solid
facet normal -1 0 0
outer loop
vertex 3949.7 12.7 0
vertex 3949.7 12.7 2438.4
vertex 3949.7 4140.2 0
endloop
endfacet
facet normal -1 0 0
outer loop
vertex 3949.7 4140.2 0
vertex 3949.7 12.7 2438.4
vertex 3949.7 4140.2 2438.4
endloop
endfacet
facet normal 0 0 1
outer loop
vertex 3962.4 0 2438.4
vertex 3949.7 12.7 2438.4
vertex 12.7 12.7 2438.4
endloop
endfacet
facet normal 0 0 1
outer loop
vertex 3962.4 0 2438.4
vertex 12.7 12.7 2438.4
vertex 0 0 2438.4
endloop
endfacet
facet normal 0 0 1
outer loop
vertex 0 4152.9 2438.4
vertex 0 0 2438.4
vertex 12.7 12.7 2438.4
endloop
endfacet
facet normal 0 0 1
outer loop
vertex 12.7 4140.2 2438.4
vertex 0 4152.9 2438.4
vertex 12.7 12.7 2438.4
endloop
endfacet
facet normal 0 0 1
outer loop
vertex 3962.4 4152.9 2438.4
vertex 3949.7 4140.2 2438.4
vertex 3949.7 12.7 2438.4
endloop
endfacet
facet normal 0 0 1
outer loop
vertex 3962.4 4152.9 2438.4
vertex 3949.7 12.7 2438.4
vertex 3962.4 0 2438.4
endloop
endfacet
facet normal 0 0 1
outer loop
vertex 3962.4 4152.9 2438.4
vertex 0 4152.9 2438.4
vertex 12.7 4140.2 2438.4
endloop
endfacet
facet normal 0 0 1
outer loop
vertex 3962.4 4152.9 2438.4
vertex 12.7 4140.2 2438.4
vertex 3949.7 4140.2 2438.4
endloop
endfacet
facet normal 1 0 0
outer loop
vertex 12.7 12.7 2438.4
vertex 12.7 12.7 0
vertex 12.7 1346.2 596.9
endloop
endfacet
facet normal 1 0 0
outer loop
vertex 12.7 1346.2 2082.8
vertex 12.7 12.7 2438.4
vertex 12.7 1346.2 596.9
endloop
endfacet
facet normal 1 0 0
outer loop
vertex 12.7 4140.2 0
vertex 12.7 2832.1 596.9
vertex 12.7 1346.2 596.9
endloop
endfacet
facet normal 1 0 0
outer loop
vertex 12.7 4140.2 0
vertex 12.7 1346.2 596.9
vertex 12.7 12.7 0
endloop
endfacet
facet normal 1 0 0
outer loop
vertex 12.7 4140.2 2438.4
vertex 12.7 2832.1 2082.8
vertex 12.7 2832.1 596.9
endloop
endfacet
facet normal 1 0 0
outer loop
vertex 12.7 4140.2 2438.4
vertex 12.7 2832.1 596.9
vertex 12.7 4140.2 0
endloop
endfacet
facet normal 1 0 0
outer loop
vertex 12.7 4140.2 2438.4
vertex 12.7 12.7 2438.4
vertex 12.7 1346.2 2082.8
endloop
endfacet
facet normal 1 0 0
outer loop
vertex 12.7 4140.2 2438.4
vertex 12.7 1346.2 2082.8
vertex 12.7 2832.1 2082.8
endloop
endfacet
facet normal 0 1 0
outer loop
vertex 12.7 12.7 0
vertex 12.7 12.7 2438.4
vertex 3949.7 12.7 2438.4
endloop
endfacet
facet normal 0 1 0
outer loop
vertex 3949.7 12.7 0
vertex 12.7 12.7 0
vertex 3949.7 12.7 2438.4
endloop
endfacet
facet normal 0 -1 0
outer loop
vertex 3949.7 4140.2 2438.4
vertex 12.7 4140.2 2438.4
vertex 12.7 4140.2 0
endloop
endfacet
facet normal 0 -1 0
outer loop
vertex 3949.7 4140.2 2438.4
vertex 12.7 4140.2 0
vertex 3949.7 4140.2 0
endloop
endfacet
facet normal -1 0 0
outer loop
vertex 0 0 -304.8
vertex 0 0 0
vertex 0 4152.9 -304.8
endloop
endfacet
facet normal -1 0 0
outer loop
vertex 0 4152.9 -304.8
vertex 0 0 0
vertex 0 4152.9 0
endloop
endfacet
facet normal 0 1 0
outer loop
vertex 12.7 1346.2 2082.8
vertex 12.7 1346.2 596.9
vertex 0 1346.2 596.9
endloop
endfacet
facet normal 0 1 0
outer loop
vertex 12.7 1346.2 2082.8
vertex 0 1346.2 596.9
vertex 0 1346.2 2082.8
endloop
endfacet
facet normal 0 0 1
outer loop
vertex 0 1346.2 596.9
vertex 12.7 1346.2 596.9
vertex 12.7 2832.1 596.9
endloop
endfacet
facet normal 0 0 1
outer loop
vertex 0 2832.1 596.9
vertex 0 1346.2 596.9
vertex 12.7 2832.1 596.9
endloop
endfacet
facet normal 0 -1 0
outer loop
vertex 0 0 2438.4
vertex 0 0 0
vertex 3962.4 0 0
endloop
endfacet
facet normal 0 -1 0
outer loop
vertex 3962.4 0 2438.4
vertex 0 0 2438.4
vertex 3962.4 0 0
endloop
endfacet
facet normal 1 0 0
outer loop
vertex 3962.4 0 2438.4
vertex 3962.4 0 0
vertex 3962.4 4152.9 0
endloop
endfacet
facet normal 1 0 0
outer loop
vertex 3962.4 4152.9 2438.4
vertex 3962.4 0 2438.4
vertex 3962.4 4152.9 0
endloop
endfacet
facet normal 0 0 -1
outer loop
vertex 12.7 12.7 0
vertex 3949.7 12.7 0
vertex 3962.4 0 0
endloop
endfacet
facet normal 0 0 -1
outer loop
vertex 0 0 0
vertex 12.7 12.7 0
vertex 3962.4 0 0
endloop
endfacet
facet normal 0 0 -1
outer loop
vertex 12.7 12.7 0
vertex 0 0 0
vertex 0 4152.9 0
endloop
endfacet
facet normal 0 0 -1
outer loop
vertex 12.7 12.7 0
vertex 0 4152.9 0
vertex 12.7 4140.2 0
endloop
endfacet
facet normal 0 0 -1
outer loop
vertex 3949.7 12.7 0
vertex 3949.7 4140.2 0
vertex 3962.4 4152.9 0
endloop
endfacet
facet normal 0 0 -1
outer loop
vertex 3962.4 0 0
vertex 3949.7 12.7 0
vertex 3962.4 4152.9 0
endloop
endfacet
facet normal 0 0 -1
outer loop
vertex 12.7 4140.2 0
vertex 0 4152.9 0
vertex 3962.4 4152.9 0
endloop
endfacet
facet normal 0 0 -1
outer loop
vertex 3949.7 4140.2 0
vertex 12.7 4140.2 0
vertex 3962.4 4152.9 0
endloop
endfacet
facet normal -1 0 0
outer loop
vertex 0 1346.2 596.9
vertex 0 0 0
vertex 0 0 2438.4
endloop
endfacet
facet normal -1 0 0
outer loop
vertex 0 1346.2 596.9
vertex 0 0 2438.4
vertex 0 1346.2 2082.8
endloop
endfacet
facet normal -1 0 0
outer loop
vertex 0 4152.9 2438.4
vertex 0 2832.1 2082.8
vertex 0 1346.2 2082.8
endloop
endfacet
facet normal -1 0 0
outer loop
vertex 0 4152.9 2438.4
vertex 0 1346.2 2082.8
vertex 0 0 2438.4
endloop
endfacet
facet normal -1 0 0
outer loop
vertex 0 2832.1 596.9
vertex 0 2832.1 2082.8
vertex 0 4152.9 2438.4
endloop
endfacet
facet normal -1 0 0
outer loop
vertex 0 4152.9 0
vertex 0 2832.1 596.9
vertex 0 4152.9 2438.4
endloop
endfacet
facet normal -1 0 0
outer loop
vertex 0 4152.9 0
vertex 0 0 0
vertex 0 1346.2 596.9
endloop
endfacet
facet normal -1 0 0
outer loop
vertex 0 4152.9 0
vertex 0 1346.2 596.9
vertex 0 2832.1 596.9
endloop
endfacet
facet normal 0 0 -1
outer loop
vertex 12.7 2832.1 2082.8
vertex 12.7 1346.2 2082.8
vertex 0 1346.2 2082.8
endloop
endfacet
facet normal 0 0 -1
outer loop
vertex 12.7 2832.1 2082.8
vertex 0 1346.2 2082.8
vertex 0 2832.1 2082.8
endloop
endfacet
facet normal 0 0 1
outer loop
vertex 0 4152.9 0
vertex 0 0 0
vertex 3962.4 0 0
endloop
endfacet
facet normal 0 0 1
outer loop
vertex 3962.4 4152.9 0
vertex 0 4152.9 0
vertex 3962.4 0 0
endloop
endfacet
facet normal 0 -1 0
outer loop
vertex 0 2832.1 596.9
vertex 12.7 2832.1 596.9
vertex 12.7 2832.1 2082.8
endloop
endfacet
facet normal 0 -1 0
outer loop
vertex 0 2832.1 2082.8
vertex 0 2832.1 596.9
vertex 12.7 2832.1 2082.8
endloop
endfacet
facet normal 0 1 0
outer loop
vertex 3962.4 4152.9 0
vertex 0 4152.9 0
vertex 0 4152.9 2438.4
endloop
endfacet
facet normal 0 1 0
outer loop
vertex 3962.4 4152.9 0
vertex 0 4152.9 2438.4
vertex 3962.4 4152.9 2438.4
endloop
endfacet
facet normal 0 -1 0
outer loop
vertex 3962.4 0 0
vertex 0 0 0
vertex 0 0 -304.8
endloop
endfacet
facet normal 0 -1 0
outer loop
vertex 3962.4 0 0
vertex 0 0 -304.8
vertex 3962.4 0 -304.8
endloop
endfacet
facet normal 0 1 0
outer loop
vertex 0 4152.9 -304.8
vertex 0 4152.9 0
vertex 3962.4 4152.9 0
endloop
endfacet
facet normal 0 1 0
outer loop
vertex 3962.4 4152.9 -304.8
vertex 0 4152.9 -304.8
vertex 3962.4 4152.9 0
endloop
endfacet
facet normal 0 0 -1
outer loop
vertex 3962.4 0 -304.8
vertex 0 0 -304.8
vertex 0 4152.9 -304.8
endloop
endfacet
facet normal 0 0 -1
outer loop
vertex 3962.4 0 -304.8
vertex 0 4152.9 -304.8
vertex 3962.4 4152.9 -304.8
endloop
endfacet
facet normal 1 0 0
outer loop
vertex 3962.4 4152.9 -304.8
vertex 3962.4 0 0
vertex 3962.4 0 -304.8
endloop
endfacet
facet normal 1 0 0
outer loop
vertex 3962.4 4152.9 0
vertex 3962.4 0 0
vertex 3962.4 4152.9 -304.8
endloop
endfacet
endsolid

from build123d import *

# Parameters (mm, degrees)
F2_W     = 3962.4
F2_H     = 4152.9
F3_DEPTH = 304.8
F4_DEPTH = 2438.4
F5_W     = 3937
F5_H     = 4127.5
F6_DEPTH = 2438.4
F7_W     = 1485.9
F7_H     = 1485.9
F8_DEPTH = 12.7


with BuildPart() as f3:
    # F2 (on Top) → F3 (new body)
    with BuildSketch(Plane.XY):
        with Locations((1981.2, 2076.45)):
            Rectangle(F2_W, F2_H)
    extrude(amount=-F3_DEPTH)


with BuildPart() as f4:
    # F2 (on Top) → F4 (new body)
    with BuildSketch(Plane.XY):
        with Locations((1981.2, 2076.45)):
            Rectangle(F2_W, F2_H)
    extrude(amount=F4_DEPTH)

    # F5 (on face) → F6 (cut, through all)
    with BuildSketch(Plane.XY.offset(2438.4)):
        with Locations((1981.2, 2076.45)):
            Rectangle(F5_W, F5_H)
    extrude(amount=-F6_DEPTH, mode=Mode.SUBTRACT)

    # F7 (on face) → F8 (cut, through all)
    with BuildSketch(Plane.YZ.offset(12.7)):
        with Locations((2089.15, 1339.85)):
            Rectangle(F7_W, F7_H)
    extrude(amount=-F8_DEPTH, mode=Mode.SUBTRACT)


solid = Compound([f3.part, f4.part])
